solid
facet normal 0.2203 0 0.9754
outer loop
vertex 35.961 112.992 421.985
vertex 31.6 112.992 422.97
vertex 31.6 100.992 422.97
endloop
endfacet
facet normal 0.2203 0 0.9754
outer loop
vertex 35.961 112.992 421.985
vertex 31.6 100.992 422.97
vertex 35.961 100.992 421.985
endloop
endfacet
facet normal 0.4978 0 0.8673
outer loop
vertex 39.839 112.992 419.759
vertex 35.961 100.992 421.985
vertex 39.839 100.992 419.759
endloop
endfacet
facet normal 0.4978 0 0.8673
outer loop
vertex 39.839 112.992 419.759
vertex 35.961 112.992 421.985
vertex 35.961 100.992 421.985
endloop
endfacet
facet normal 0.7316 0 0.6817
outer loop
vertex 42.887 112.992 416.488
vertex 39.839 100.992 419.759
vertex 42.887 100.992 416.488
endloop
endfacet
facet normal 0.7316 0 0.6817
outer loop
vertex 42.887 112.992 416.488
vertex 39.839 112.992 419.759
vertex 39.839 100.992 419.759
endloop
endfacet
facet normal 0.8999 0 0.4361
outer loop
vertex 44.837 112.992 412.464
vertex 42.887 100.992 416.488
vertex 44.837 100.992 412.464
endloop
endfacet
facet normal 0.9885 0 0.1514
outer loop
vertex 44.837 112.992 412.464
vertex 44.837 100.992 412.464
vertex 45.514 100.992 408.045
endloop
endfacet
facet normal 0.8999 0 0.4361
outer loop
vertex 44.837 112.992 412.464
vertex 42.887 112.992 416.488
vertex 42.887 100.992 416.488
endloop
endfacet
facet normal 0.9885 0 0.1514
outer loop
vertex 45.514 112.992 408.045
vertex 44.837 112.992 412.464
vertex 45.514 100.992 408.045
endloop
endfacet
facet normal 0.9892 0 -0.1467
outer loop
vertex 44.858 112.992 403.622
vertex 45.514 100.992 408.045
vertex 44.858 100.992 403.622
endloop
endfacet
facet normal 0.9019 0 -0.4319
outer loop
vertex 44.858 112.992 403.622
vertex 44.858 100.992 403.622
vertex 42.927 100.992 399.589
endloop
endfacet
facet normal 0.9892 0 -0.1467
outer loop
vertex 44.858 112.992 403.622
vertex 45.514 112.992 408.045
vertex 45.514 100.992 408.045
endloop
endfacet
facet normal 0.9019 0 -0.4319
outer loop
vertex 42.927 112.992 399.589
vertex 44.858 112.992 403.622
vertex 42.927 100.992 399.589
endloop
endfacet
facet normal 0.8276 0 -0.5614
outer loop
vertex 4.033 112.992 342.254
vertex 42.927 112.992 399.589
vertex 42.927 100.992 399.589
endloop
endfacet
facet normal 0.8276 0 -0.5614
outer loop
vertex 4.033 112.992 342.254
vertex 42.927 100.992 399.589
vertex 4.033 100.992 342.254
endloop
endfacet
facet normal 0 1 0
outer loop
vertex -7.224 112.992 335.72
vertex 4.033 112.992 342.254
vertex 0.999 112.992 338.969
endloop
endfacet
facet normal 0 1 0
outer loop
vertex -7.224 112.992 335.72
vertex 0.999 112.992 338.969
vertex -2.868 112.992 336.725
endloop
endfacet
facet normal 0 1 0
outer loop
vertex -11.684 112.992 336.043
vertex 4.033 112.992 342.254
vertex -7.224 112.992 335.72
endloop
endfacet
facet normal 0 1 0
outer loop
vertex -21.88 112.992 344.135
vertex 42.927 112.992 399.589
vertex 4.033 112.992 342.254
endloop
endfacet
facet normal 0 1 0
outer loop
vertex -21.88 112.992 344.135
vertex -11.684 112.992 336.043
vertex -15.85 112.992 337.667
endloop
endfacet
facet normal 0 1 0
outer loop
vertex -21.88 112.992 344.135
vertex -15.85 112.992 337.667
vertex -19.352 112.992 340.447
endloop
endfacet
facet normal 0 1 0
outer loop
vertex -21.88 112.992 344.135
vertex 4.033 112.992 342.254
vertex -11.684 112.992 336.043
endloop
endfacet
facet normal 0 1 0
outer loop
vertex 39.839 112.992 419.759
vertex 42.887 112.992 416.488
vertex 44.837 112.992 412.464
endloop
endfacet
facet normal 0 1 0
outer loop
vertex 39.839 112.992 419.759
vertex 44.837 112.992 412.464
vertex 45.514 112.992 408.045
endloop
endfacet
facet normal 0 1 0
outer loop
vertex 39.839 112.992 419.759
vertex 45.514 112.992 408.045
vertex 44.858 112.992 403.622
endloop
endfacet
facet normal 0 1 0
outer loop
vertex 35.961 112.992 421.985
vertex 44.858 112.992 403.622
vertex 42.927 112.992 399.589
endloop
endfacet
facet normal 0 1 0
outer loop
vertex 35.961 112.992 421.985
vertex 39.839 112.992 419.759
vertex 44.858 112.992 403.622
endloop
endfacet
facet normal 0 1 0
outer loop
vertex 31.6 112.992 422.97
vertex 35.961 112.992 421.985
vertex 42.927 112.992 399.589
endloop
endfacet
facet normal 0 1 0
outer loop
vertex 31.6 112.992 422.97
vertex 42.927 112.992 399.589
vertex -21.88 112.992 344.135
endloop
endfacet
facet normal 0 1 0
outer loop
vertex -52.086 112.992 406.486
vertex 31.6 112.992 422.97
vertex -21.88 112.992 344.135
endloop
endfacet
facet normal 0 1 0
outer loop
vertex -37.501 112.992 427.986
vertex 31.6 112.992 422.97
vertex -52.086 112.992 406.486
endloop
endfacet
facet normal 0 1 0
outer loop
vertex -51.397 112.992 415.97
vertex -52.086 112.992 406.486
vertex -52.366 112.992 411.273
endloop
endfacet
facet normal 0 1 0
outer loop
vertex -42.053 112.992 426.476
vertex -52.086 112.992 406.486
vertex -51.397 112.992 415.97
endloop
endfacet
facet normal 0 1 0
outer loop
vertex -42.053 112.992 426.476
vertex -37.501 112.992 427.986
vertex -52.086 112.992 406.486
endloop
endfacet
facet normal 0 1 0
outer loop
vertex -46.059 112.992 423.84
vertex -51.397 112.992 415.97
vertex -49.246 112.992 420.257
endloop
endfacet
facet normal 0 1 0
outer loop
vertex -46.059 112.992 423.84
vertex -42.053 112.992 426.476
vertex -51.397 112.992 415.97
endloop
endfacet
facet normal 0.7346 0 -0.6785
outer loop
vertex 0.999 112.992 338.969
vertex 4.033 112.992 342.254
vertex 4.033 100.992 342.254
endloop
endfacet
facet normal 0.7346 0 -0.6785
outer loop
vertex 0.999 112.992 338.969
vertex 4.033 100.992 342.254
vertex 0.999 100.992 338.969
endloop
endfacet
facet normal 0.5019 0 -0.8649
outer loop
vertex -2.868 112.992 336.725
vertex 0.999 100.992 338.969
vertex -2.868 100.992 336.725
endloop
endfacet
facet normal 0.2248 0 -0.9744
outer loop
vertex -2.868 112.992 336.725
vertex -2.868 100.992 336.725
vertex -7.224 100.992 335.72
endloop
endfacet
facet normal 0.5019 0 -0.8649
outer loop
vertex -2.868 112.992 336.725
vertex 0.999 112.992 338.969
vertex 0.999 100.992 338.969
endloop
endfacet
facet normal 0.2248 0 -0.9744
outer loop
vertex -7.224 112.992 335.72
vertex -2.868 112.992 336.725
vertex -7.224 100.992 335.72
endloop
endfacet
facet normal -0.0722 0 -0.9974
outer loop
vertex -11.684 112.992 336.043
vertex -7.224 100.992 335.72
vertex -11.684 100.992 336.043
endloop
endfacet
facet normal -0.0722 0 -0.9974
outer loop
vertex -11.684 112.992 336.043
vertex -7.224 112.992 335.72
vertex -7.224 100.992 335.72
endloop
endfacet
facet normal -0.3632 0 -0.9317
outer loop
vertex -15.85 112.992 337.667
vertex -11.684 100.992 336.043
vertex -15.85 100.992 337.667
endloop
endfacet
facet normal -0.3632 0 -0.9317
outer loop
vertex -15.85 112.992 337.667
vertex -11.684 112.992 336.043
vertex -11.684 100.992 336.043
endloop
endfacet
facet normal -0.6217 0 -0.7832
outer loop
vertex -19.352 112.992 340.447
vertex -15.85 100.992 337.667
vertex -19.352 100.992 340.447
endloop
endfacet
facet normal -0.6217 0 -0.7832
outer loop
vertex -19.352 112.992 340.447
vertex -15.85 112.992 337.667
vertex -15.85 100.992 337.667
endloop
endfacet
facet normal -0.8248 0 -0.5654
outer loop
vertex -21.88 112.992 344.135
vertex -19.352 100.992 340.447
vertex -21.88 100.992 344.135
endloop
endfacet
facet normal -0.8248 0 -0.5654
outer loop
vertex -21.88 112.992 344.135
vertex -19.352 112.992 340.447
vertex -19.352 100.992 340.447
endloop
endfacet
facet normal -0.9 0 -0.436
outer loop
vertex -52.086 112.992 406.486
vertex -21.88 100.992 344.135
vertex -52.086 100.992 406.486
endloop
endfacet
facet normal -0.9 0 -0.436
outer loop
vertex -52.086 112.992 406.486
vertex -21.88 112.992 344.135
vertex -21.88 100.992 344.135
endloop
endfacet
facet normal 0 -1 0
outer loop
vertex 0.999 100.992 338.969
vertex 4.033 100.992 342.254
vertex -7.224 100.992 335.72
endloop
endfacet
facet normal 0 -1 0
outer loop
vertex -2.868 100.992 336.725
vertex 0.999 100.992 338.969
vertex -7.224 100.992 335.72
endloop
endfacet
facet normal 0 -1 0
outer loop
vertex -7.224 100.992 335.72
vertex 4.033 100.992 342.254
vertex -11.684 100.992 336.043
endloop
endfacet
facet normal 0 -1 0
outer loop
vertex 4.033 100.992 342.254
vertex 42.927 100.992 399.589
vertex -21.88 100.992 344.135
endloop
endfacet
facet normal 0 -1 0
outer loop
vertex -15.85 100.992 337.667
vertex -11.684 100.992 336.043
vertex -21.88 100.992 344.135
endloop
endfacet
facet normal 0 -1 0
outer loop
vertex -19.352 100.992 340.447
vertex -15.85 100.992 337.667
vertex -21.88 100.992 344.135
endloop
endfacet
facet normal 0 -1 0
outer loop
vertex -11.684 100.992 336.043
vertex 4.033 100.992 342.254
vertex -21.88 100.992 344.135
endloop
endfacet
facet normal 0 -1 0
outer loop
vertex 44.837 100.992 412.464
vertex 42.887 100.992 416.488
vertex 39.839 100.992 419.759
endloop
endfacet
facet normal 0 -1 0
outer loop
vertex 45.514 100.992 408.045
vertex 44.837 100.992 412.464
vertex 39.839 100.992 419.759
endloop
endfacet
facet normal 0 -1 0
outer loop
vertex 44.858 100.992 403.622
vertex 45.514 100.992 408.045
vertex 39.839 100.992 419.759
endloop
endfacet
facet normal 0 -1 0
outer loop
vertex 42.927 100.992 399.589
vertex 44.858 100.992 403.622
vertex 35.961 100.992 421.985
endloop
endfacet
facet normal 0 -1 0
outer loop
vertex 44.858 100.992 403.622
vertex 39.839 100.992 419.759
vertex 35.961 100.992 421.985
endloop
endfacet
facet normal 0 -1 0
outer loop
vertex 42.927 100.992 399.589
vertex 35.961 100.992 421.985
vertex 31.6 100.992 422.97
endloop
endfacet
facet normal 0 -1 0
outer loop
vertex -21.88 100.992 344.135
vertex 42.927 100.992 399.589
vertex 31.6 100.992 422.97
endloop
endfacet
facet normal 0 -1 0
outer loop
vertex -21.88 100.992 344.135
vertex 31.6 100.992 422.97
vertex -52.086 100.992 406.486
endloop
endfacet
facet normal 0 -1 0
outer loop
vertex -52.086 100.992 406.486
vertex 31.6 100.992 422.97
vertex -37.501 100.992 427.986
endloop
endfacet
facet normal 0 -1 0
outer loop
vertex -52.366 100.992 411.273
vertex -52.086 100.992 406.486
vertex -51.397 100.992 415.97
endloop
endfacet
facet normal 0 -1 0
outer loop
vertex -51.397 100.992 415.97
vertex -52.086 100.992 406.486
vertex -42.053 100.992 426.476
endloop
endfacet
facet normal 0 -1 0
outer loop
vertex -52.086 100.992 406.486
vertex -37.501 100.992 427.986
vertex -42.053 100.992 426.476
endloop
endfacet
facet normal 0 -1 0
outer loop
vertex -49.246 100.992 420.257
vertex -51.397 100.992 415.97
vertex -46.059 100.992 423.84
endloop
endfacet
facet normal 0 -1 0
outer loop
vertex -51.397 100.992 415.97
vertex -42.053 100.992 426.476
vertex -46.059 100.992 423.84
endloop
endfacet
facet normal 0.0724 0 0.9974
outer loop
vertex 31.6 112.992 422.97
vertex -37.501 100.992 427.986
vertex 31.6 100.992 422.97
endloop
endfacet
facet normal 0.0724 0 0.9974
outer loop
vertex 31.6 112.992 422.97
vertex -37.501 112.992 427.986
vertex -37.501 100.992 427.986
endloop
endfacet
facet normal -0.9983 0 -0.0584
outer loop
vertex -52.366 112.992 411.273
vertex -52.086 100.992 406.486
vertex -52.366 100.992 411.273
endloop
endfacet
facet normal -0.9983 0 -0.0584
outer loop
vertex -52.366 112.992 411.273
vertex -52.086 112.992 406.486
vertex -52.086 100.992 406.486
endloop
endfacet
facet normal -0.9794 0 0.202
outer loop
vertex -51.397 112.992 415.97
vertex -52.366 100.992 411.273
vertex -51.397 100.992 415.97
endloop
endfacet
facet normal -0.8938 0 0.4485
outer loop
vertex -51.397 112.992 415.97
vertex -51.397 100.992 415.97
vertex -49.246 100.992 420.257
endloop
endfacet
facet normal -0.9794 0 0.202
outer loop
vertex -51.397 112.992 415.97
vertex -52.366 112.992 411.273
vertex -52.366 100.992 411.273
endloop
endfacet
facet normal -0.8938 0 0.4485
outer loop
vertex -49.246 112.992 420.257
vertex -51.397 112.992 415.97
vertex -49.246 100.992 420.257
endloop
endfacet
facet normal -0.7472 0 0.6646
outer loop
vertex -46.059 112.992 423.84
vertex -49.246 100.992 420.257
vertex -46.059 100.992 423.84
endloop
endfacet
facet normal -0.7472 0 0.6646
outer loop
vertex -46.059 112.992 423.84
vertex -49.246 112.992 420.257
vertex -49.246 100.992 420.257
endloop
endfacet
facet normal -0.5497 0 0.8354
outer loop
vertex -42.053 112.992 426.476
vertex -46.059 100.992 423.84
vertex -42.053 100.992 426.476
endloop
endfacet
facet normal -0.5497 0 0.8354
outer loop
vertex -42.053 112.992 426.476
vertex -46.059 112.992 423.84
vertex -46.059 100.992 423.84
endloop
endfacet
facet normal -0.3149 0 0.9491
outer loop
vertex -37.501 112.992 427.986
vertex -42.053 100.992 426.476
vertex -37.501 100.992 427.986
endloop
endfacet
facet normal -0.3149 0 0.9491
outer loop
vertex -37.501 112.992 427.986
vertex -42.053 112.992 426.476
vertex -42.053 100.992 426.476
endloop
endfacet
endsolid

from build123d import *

# Parameters (mm, degrees)
BOSS_EXTRUDE1_DEPTH = 10
BOSS_EXTRUDE2_DEPTH = 10
BOSS_EXTRUDE3_DEPTH = 2


with BuildPart() as part:
    # Sketch1 → Boss-Extrude1 (new body)
    with BuildSketch(Plane.XZ.offset(-112.992351319)):
        with BuildLine():
            Line((-38.224542698, 418.012407464), (30.875674984, 412.996441329))
            ThreePointArc((30.875674984, 412.996441329), (35.013440502, 410.189504116), (34.651444327, 405.202625456))
            Line((34.651444327, 405.202625456), (-4.242618611, 347.868064603))
            ThreePointArc((-4.242618611, 347.868064603), (-8.742380303, 345.688123157), (-12.880145821, 348.49506037))
            Line((-12.880145821, 348.49506037), (-43.086300565, 410.845587357))
            ThreePointArc((-43.086300565, 410.845587357), (-42.724304391, 415.832466017), (-38.224542698, 418.012407464))
        make_face()
    extrude(amount=BOSS_EXTRUDE1_DEPTH)



with BuildPart() as body_2:
    # Sketch3 → Boss-Extrude2 (new body)
    with BuildSketch(Plane.XZ.offset(-102.992351319)):
        with BuildLine():
            Line((4.032912425, 342.254190176), (42.926975363, 399.588751029))
            ThreePointArc((42.926975363, 399.588751029), (44.012963887, 414.549387009), (31.599667334, 422.970198649))
            Line((31.599667334, 422.970198649), (-37.500550349, 427.986164784))
            ThreePointArc((-37.500550349, 427.986164784), (-49.24607828, 420.256643692), (-52.08582395, 406.485704464))
            Line((-52.08582395, 406.485704464), (-21.879669206, 344.135177477))
            ThreePointArc((-21.879669206, 344.135177477), (-9.466372653, 335.714365837), (4.032912425, 342.254190176))
        make_face()
        with BuildLine():
            ThreePointArc((-43.086300565, 410.845587357), (-42.724304391, 415.832466017), (-38.224542698, 418.012407464))
            Line((-38.224542698, 418.012407464), (30.875674984, 412.996441329))
            ThreePointArc((30.875674984, 412.996441329), (35.013440502, 410.189504116), (34.651444327, 405.202625456))
            Line((34.651444327, 405.202625456), (-4.242618611, 347.868064603))
            ThreePointArc((-4.242618611, 347.868064603), (-8.742380303, 345.688123157), (-12.880145821, 348.49506037))
            Line((-12.880145821, 348.49506037), (-43.086300565, 410.845587357))
        make_face(mode=Mode.SUBTRACT)
    extrude(amount=-BOSS_EXTRUDE2_DEPTH)


with BuildPart() as part_1:
    add(part.part)

    add(body_2.part)  # Boss-Extrude3 merges body 2
    # Sketch3<3> → Boss-Extrude3 (add)
    with BuildSketch(Plane.XZ.offset(-102.992351319)):
        with BuildLine():
            Line((4.032912425, 342.254190176), (42.926975363, 399.588751029))
            ThreePointArc((42.926975363, 399.588751029), (44.012963887, 414.549387009), (31.599667334, 422.970198649))
            Line((31.599667334, 422.970198649), (-37.500550349, 427.986164784))
            ThreePointArc((-37.500550349, 427.986164784), (-49.24607828, 420.256643692), (-52.08582395, 406.485704464))
            Line((-52.08582395, 406.485704464), (-21.879669206, 344.135177477))
            ThreePointArc((-21.879669206, 344.135177477), (-9.466372653, 335.714365837), (4.032912425, 342.254190176))
        make_face()
    extrude(amount=BOSS_EXTRUDE3_DEPTH)


solid = part_1.part
